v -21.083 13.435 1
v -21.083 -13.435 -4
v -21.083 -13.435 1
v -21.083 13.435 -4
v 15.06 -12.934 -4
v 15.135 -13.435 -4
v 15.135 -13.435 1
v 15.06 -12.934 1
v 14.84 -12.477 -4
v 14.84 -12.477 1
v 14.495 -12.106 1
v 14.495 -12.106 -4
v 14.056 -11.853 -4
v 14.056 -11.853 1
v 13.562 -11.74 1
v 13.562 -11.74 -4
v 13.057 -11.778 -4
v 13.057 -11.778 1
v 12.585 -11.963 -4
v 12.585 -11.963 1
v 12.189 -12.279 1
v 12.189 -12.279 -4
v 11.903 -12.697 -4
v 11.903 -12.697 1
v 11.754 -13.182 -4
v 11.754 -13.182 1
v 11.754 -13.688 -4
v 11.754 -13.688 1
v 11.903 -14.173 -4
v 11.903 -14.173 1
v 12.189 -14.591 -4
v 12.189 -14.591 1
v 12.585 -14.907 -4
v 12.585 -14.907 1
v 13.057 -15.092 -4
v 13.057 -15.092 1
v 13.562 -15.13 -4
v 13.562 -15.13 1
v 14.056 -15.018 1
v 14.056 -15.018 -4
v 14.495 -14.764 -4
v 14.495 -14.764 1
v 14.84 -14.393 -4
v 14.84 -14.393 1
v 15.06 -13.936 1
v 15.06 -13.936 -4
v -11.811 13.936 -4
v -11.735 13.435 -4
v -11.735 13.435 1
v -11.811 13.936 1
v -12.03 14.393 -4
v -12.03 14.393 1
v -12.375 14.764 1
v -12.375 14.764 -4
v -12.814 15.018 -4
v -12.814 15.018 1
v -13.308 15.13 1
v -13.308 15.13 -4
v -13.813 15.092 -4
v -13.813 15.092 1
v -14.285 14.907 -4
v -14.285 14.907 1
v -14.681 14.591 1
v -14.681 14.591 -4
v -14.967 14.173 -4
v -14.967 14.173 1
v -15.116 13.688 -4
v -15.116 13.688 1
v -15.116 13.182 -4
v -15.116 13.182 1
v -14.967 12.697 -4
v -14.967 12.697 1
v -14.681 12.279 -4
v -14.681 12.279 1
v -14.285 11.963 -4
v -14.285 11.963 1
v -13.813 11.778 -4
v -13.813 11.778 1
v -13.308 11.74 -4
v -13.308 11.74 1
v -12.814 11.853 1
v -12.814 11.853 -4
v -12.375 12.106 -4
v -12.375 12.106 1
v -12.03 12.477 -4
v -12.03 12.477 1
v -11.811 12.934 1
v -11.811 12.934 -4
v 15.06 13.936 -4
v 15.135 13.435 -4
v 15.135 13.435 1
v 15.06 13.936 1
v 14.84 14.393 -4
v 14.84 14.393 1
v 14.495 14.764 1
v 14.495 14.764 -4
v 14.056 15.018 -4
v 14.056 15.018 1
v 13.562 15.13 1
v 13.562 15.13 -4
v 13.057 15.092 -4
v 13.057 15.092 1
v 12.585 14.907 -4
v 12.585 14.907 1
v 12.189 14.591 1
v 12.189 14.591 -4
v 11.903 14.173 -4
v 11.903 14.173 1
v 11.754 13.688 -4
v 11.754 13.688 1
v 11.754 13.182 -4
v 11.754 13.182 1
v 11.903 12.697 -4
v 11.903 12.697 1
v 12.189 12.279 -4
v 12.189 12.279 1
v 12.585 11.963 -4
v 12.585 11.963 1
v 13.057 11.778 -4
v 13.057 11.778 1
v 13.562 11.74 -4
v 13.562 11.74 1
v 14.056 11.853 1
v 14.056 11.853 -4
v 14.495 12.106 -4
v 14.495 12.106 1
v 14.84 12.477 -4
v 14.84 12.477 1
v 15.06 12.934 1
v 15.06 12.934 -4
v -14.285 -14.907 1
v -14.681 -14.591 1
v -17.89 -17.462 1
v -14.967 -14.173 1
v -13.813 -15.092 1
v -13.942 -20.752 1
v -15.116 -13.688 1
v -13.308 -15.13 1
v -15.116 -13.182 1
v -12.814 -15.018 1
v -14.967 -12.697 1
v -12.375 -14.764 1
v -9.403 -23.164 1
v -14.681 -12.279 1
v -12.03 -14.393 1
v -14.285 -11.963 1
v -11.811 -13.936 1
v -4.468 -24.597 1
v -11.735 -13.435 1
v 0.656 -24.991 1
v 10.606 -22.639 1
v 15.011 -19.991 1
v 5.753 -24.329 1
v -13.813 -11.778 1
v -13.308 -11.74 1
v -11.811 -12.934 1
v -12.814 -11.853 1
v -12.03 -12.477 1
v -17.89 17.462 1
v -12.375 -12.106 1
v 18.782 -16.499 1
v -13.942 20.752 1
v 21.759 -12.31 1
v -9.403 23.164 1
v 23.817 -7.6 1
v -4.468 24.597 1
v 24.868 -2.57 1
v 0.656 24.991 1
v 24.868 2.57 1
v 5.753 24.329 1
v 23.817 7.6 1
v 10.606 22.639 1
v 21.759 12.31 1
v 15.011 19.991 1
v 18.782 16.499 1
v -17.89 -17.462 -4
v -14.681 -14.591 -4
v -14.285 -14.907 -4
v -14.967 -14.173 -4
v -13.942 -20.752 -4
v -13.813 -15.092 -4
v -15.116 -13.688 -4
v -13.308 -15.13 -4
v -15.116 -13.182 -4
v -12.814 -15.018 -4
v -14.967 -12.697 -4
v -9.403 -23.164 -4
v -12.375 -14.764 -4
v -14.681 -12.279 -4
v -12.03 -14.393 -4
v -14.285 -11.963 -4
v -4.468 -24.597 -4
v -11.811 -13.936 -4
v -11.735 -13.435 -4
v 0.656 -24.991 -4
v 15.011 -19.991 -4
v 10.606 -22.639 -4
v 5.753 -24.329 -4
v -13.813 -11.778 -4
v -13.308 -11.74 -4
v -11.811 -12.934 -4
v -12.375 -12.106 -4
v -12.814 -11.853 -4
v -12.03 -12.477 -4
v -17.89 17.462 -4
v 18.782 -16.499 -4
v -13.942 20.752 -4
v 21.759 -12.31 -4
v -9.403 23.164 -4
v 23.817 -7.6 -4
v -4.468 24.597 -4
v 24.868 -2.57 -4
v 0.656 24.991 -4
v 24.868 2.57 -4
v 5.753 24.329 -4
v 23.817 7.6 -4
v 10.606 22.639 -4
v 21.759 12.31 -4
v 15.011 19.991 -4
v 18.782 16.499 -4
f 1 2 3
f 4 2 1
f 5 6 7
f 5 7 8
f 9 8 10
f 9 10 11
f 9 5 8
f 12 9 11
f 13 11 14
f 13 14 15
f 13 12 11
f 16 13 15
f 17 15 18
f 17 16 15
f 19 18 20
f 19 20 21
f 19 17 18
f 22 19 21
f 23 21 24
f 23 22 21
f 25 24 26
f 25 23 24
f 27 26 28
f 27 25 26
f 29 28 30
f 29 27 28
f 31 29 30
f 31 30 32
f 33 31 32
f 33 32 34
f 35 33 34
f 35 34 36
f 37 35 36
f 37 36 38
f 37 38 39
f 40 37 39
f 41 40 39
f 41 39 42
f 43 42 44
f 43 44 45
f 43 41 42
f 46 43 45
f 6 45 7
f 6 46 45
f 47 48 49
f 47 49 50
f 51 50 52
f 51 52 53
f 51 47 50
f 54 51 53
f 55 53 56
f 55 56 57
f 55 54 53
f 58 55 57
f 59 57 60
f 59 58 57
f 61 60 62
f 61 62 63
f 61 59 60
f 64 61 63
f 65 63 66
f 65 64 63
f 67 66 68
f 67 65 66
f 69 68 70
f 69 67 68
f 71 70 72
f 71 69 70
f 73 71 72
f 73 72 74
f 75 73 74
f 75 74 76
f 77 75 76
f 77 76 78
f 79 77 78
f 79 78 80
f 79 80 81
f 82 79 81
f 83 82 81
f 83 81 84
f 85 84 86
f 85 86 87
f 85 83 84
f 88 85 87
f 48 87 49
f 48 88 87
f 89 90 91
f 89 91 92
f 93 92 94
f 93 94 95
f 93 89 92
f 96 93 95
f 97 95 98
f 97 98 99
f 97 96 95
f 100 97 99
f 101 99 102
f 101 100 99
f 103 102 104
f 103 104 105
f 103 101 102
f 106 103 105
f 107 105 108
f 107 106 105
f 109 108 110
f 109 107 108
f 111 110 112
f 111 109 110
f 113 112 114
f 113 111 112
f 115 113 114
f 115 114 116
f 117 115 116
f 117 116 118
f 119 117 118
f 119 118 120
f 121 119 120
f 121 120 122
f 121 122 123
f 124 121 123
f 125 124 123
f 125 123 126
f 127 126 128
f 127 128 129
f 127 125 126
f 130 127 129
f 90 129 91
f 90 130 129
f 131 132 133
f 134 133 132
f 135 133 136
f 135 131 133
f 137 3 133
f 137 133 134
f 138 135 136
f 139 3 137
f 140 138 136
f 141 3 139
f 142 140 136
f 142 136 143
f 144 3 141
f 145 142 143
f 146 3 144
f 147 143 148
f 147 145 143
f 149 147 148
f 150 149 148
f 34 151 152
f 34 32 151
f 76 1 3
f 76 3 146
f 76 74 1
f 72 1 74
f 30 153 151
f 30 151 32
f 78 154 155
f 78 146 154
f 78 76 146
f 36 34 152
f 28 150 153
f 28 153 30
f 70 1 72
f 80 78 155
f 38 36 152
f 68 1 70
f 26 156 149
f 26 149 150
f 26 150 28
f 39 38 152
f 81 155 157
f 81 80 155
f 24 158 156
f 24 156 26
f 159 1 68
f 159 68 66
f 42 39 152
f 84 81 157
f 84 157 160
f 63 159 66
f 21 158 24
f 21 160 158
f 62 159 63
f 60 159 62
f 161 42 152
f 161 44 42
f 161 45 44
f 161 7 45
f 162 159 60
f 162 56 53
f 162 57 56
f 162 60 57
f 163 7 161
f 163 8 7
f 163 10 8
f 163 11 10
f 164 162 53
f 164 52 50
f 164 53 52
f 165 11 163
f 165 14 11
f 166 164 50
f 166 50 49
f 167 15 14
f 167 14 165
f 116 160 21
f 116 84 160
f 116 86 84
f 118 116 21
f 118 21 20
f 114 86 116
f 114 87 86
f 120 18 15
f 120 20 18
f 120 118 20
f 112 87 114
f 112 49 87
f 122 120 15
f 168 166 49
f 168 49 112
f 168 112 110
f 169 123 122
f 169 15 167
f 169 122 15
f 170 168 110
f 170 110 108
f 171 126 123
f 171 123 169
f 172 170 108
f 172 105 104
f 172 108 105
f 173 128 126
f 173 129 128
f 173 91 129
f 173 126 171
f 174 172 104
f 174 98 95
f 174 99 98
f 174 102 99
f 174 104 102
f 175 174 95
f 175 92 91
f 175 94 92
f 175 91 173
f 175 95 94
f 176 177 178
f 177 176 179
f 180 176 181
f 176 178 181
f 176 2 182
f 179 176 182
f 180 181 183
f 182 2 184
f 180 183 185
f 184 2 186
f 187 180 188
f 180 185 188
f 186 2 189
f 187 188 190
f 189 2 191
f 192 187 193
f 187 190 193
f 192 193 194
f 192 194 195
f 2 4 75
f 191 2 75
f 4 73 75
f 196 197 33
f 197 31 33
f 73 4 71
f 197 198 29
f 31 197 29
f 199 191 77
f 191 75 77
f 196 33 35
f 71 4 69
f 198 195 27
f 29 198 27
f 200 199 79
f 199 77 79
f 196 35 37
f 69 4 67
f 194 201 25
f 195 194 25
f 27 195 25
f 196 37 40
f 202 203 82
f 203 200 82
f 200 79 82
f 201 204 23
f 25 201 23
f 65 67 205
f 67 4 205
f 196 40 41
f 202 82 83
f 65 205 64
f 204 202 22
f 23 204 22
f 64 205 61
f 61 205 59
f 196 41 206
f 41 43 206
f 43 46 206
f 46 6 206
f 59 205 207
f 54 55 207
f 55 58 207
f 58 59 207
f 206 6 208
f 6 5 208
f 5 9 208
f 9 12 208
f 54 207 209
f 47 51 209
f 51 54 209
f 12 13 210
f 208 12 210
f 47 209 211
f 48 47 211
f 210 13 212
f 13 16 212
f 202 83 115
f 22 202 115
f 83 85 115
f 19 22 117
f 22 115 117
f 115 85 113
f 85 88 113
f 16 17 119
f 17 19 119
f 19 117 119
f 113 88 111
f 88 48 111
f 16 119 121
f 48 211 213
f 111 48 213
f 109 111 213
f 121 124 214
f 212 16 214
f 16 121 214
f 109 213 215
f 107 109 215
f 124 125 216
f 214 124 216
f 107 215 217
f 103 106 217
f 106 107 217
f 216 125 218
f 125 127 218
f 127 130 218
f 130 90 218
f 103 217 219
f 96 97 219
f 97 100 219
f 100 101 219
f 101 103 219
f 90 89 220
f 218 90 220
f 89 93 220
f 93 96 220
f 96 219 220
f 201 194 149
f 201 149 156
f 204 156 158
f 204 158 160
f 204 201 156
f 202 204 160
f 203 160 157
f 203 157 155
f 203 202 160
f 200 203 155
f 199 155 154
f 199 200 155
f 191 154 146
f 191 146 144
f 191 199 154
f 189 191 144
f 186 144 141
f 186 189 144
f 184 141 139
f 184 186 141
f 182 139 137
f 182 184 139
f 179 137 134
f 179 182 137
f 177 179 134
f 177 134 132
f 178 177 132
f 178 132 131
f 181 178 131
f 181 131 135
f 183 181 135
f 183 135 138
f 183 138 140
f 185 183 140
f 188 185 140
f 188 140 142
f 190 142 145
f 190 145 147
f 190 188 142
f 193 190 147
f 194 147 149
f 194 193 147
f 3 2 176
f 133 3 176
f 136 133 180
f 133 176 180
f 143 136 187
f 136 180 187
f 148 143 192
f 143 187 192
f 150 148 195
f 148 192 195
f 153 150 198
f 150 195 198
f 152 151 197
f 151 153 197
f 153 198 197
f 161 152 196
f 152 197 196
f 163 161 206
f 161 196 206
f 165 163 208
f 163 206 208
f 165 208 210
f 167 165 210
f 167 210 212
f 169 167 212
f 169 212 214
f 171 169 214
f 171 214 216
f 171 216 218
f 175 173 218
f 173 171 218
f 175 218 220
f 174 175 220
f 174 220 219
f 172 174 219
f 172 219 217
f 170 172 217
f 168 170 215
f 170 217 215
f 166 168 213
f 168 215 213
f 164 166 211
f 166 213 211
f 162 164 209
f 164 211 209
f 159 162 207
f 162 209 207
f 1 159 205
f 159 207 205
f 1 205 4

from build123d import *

# Parameters (mm, degrees)
BOSS_EXTRU_1_DEPTH      = 1
BOSS_EXTRU_1_DEPTH_BACK = 4
ESQUISSE1_R             = 25
ESQUISSE1_R_2           = 1.7
ESQUISSE2_W             = 7.120092975
ESQUISSE2_H             = 26.945103847
ENL_V_MAT_EXTRU_1_DEPTH = 36.707142143


with BuildPart() as part:
    # Esquisse1 → Boss.-Extru.1 (new, two sides: drawn at the far end of the back side and taken through both)
    with BuildSketch(Plane.XY.offset(-BOSS_EXTRU_1_DEPTH_BACK)):
        Circle(ESQUISSE1_R)
        with Locations((-13.435028843, 13.435028843)):
            Circle(ESQUISSE1_R_2, mode=Mode.SUBTRACT)
        with Locations((13.435028843, 13.435028843)):
            Circle(ESQUISSE1_R_2, mode=Mode.SUBTRACT)
        with Locations((13.435028843, -13.435028843)):
            Circle(ESQUISSE1_R_2, mode=Mode.SUBTRACT)
        with Locations((-13.435028843, -13.435028843)):
            Circle(ESQUISSE1_R_2, mode=Mode.SUBTRACT)
    extrude(amount=BOSS_EXTRU_1_DEPTH + BOSS_EXTRU_1_DEPTH_BACK)

    # Esquisse2 → Enlèv. mat.-Extru.1 (cut, through all)
    with BuildSketch(Plane(origin=(0, 0, -4), x_dir=(-1, 0, 0), z_dir=(0, 0, -1))):
        with Locations((24.643215129, 0.03752308)):
            Rectangle(ESQUISSE2_W, ESQUISSE2_H)
    extrude(amount=-ENL_V_MAT_EXTRU_1_DEPTH, mode=Mode.SUBTRACT)


solid = part.part
